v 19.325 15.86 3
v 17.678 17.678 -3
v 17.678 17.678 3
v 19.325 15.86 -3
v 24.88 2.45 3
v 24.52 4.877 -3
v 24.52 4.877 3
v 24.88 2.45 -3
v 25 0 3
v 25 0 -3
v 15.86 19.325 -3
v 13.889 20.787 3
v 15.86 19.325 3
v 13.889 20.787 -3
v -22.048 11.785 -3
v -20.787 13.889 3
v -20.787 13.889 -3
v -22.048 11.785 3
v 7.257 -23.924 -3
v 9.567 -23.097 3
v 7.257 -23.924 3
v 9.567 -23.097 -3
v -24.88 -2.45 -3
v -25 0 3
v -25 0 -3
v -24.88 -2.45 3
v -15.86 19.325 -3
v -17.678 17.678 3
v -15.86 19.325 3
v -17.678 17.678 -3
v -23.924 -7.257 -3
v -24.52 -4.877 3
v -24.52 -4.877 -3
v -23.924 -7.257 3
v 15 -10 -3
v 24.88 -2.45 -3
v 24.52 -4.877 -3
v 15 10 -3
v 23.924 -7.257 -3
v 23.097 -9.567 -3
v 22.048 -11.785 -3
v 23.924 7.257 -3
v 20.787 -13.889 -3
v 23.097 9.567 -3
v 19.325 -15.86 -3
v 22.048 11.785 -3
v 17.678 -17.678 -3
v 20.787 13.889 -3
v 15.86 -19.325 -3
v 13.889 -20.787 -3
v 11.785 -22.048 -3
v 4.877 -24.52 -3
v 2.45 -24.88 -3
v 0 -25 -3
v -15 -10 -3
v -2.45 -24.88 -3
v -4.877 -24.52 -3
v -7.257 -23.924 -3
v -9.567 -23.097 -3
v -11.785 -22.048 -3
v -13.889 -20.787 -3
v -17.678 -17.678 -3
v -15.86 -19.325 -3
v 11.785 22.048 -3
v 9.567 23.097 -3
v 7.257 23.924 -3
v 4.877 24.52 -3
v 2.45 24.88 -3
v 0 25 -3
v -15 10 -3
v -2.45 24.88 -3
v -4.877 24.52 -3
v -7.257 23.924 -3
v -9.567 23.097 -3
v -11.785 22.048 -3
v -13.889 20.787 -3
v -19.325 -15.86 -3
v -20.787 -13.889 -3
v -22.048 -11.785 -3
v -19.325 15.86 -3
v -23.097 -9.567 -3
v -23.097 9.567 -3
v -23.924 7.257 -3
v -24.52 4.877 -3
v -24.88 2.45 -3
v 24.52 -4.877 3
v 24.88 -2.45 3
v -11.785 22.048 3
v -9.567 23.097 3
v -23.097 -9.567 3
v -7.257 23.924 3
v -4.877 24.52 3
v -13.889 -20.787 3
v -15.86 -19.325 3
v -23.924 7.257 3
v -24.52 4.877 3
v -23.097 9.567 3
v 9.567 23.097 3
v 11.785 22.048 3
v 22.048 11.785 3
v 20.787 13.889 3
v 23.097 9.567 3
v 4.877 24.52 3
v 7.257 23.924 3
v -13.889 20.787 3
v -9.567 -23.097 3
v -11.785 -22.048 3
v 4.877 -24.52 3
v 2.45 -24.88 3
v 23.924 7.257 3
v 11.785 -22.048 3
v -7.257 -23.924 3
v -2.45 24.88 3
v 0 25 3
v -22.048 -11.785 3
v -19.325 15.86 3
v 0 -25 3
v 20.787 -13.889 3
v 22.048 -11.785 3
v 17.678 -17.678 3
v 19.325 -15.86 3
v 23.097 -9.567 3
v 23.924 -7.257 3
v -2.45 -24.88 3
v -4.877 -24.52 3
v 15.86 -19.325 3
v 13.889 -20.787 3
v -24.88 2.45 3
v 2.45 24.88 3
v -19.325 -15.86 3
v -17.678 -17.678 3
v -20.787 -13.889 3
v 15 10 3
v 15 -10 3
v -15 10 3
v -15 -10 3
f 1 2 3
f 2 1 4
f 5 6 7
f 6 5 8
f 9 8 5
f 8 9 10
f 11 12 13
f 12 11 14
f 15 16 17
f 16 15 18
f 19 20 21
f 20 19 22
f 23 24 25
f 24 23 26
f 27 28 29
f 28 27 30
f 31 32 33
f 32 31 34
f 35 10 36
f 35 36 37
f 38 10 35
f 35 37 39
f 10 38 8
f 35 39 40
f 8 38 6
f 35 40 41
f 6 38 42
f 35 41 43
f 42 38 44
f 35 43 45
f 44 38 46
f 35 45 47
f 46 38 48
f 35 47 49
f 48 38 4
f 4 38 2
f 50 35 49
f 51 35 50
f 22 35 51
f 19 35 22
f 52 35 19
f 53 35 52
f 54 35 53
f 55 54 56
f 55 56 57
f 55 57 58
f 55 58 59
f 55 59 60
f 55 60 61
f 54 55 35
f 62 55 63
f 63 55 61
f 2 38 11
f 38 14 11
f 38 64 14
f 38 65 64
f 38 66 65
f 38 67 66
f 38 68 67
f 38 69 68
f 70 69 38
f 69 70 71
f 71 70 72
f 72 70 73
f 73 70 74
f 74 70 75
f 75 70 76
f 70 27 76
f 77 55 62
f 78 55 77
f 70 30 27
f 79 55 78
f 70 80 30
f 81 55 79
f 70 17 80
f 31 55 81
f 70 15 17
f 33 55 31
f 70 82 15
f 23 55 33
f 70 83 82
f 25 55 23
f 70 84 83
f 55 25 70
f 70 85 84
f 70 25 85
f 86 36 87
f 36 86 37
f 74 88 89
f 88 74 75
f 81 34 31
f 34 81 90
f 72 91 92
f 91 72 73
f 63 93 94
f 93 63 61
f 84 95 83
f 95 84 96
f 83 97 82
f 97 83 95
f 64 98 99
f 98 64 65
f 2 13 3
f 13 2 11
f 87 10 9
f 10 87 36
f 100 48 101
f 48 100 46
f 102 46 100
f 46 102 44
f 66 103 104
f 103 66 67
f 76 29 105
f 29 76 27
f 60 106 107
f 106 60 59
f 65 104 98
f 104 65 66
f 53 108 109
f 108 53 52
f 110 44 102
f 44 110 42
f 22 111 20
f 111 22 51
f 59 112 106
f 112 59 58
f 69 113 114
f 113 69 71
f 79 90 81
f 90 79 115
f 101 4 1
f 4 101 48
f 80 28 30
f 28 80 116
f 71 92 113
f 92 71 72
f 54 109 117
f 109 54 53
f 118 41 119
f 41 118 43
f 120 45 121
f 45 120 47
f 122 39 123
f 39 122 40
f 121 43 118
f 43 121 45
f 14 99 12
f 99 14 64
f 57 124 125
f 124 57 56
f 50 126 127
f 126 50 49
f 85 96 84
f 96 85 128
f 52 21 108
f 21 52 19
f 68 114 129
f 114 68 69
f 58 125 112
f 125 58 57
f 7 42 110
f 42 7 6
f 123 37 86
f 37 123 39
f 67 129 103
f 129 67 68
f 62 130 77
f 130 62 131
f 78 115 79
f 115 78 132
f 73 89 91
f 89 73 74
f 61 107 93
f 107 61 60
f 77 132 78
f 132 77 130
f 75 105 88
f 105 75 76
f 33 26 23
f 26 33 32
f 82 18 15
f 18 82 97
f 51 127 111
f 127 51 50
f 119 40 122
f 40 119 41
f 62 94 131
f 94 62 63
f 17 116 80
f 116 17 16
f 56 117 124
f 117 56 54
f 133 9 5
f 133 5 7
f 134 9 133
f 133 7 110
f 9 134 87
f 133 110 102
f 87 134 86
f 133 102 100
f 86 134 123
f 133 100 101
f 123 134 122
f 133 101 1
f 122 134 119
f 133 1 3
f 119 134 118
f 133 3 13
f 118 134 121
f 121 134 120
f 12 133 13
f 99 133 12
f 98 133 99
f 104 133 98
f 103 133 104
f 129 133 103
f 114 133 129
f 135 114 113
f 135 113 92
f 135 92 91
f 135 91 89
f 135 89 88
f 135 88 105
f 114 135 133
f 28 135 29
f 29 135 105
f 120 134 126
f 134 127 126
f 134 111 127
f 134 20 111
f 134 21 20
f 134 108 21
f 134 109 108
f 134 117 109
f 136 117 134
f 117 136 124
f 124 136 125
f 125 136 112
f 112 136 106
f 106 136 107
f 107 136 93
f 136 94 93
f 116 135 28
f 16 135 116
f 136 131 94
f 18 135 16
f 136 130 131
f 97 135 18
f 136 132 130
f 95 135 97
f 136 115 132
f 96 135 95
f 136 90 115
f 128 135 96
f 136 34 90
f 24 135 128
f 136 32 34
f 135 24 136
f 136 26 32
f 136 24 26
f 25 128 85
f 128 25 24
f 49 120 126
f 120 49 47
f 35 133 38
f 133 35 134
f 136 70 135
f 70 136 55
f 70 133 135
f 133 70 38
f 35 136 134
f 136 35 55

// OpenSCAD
// A plate with a central bore.

plate_x = 30;
plate_y = 20;
plate_z = 6;
bore_d  = 50;
$fn = 64;

difference() {
    cylinder(h = plate_z, d = bore_d, center = true);
    cube([plate_x, plate_y, plate_z + 2], center = true);
}
